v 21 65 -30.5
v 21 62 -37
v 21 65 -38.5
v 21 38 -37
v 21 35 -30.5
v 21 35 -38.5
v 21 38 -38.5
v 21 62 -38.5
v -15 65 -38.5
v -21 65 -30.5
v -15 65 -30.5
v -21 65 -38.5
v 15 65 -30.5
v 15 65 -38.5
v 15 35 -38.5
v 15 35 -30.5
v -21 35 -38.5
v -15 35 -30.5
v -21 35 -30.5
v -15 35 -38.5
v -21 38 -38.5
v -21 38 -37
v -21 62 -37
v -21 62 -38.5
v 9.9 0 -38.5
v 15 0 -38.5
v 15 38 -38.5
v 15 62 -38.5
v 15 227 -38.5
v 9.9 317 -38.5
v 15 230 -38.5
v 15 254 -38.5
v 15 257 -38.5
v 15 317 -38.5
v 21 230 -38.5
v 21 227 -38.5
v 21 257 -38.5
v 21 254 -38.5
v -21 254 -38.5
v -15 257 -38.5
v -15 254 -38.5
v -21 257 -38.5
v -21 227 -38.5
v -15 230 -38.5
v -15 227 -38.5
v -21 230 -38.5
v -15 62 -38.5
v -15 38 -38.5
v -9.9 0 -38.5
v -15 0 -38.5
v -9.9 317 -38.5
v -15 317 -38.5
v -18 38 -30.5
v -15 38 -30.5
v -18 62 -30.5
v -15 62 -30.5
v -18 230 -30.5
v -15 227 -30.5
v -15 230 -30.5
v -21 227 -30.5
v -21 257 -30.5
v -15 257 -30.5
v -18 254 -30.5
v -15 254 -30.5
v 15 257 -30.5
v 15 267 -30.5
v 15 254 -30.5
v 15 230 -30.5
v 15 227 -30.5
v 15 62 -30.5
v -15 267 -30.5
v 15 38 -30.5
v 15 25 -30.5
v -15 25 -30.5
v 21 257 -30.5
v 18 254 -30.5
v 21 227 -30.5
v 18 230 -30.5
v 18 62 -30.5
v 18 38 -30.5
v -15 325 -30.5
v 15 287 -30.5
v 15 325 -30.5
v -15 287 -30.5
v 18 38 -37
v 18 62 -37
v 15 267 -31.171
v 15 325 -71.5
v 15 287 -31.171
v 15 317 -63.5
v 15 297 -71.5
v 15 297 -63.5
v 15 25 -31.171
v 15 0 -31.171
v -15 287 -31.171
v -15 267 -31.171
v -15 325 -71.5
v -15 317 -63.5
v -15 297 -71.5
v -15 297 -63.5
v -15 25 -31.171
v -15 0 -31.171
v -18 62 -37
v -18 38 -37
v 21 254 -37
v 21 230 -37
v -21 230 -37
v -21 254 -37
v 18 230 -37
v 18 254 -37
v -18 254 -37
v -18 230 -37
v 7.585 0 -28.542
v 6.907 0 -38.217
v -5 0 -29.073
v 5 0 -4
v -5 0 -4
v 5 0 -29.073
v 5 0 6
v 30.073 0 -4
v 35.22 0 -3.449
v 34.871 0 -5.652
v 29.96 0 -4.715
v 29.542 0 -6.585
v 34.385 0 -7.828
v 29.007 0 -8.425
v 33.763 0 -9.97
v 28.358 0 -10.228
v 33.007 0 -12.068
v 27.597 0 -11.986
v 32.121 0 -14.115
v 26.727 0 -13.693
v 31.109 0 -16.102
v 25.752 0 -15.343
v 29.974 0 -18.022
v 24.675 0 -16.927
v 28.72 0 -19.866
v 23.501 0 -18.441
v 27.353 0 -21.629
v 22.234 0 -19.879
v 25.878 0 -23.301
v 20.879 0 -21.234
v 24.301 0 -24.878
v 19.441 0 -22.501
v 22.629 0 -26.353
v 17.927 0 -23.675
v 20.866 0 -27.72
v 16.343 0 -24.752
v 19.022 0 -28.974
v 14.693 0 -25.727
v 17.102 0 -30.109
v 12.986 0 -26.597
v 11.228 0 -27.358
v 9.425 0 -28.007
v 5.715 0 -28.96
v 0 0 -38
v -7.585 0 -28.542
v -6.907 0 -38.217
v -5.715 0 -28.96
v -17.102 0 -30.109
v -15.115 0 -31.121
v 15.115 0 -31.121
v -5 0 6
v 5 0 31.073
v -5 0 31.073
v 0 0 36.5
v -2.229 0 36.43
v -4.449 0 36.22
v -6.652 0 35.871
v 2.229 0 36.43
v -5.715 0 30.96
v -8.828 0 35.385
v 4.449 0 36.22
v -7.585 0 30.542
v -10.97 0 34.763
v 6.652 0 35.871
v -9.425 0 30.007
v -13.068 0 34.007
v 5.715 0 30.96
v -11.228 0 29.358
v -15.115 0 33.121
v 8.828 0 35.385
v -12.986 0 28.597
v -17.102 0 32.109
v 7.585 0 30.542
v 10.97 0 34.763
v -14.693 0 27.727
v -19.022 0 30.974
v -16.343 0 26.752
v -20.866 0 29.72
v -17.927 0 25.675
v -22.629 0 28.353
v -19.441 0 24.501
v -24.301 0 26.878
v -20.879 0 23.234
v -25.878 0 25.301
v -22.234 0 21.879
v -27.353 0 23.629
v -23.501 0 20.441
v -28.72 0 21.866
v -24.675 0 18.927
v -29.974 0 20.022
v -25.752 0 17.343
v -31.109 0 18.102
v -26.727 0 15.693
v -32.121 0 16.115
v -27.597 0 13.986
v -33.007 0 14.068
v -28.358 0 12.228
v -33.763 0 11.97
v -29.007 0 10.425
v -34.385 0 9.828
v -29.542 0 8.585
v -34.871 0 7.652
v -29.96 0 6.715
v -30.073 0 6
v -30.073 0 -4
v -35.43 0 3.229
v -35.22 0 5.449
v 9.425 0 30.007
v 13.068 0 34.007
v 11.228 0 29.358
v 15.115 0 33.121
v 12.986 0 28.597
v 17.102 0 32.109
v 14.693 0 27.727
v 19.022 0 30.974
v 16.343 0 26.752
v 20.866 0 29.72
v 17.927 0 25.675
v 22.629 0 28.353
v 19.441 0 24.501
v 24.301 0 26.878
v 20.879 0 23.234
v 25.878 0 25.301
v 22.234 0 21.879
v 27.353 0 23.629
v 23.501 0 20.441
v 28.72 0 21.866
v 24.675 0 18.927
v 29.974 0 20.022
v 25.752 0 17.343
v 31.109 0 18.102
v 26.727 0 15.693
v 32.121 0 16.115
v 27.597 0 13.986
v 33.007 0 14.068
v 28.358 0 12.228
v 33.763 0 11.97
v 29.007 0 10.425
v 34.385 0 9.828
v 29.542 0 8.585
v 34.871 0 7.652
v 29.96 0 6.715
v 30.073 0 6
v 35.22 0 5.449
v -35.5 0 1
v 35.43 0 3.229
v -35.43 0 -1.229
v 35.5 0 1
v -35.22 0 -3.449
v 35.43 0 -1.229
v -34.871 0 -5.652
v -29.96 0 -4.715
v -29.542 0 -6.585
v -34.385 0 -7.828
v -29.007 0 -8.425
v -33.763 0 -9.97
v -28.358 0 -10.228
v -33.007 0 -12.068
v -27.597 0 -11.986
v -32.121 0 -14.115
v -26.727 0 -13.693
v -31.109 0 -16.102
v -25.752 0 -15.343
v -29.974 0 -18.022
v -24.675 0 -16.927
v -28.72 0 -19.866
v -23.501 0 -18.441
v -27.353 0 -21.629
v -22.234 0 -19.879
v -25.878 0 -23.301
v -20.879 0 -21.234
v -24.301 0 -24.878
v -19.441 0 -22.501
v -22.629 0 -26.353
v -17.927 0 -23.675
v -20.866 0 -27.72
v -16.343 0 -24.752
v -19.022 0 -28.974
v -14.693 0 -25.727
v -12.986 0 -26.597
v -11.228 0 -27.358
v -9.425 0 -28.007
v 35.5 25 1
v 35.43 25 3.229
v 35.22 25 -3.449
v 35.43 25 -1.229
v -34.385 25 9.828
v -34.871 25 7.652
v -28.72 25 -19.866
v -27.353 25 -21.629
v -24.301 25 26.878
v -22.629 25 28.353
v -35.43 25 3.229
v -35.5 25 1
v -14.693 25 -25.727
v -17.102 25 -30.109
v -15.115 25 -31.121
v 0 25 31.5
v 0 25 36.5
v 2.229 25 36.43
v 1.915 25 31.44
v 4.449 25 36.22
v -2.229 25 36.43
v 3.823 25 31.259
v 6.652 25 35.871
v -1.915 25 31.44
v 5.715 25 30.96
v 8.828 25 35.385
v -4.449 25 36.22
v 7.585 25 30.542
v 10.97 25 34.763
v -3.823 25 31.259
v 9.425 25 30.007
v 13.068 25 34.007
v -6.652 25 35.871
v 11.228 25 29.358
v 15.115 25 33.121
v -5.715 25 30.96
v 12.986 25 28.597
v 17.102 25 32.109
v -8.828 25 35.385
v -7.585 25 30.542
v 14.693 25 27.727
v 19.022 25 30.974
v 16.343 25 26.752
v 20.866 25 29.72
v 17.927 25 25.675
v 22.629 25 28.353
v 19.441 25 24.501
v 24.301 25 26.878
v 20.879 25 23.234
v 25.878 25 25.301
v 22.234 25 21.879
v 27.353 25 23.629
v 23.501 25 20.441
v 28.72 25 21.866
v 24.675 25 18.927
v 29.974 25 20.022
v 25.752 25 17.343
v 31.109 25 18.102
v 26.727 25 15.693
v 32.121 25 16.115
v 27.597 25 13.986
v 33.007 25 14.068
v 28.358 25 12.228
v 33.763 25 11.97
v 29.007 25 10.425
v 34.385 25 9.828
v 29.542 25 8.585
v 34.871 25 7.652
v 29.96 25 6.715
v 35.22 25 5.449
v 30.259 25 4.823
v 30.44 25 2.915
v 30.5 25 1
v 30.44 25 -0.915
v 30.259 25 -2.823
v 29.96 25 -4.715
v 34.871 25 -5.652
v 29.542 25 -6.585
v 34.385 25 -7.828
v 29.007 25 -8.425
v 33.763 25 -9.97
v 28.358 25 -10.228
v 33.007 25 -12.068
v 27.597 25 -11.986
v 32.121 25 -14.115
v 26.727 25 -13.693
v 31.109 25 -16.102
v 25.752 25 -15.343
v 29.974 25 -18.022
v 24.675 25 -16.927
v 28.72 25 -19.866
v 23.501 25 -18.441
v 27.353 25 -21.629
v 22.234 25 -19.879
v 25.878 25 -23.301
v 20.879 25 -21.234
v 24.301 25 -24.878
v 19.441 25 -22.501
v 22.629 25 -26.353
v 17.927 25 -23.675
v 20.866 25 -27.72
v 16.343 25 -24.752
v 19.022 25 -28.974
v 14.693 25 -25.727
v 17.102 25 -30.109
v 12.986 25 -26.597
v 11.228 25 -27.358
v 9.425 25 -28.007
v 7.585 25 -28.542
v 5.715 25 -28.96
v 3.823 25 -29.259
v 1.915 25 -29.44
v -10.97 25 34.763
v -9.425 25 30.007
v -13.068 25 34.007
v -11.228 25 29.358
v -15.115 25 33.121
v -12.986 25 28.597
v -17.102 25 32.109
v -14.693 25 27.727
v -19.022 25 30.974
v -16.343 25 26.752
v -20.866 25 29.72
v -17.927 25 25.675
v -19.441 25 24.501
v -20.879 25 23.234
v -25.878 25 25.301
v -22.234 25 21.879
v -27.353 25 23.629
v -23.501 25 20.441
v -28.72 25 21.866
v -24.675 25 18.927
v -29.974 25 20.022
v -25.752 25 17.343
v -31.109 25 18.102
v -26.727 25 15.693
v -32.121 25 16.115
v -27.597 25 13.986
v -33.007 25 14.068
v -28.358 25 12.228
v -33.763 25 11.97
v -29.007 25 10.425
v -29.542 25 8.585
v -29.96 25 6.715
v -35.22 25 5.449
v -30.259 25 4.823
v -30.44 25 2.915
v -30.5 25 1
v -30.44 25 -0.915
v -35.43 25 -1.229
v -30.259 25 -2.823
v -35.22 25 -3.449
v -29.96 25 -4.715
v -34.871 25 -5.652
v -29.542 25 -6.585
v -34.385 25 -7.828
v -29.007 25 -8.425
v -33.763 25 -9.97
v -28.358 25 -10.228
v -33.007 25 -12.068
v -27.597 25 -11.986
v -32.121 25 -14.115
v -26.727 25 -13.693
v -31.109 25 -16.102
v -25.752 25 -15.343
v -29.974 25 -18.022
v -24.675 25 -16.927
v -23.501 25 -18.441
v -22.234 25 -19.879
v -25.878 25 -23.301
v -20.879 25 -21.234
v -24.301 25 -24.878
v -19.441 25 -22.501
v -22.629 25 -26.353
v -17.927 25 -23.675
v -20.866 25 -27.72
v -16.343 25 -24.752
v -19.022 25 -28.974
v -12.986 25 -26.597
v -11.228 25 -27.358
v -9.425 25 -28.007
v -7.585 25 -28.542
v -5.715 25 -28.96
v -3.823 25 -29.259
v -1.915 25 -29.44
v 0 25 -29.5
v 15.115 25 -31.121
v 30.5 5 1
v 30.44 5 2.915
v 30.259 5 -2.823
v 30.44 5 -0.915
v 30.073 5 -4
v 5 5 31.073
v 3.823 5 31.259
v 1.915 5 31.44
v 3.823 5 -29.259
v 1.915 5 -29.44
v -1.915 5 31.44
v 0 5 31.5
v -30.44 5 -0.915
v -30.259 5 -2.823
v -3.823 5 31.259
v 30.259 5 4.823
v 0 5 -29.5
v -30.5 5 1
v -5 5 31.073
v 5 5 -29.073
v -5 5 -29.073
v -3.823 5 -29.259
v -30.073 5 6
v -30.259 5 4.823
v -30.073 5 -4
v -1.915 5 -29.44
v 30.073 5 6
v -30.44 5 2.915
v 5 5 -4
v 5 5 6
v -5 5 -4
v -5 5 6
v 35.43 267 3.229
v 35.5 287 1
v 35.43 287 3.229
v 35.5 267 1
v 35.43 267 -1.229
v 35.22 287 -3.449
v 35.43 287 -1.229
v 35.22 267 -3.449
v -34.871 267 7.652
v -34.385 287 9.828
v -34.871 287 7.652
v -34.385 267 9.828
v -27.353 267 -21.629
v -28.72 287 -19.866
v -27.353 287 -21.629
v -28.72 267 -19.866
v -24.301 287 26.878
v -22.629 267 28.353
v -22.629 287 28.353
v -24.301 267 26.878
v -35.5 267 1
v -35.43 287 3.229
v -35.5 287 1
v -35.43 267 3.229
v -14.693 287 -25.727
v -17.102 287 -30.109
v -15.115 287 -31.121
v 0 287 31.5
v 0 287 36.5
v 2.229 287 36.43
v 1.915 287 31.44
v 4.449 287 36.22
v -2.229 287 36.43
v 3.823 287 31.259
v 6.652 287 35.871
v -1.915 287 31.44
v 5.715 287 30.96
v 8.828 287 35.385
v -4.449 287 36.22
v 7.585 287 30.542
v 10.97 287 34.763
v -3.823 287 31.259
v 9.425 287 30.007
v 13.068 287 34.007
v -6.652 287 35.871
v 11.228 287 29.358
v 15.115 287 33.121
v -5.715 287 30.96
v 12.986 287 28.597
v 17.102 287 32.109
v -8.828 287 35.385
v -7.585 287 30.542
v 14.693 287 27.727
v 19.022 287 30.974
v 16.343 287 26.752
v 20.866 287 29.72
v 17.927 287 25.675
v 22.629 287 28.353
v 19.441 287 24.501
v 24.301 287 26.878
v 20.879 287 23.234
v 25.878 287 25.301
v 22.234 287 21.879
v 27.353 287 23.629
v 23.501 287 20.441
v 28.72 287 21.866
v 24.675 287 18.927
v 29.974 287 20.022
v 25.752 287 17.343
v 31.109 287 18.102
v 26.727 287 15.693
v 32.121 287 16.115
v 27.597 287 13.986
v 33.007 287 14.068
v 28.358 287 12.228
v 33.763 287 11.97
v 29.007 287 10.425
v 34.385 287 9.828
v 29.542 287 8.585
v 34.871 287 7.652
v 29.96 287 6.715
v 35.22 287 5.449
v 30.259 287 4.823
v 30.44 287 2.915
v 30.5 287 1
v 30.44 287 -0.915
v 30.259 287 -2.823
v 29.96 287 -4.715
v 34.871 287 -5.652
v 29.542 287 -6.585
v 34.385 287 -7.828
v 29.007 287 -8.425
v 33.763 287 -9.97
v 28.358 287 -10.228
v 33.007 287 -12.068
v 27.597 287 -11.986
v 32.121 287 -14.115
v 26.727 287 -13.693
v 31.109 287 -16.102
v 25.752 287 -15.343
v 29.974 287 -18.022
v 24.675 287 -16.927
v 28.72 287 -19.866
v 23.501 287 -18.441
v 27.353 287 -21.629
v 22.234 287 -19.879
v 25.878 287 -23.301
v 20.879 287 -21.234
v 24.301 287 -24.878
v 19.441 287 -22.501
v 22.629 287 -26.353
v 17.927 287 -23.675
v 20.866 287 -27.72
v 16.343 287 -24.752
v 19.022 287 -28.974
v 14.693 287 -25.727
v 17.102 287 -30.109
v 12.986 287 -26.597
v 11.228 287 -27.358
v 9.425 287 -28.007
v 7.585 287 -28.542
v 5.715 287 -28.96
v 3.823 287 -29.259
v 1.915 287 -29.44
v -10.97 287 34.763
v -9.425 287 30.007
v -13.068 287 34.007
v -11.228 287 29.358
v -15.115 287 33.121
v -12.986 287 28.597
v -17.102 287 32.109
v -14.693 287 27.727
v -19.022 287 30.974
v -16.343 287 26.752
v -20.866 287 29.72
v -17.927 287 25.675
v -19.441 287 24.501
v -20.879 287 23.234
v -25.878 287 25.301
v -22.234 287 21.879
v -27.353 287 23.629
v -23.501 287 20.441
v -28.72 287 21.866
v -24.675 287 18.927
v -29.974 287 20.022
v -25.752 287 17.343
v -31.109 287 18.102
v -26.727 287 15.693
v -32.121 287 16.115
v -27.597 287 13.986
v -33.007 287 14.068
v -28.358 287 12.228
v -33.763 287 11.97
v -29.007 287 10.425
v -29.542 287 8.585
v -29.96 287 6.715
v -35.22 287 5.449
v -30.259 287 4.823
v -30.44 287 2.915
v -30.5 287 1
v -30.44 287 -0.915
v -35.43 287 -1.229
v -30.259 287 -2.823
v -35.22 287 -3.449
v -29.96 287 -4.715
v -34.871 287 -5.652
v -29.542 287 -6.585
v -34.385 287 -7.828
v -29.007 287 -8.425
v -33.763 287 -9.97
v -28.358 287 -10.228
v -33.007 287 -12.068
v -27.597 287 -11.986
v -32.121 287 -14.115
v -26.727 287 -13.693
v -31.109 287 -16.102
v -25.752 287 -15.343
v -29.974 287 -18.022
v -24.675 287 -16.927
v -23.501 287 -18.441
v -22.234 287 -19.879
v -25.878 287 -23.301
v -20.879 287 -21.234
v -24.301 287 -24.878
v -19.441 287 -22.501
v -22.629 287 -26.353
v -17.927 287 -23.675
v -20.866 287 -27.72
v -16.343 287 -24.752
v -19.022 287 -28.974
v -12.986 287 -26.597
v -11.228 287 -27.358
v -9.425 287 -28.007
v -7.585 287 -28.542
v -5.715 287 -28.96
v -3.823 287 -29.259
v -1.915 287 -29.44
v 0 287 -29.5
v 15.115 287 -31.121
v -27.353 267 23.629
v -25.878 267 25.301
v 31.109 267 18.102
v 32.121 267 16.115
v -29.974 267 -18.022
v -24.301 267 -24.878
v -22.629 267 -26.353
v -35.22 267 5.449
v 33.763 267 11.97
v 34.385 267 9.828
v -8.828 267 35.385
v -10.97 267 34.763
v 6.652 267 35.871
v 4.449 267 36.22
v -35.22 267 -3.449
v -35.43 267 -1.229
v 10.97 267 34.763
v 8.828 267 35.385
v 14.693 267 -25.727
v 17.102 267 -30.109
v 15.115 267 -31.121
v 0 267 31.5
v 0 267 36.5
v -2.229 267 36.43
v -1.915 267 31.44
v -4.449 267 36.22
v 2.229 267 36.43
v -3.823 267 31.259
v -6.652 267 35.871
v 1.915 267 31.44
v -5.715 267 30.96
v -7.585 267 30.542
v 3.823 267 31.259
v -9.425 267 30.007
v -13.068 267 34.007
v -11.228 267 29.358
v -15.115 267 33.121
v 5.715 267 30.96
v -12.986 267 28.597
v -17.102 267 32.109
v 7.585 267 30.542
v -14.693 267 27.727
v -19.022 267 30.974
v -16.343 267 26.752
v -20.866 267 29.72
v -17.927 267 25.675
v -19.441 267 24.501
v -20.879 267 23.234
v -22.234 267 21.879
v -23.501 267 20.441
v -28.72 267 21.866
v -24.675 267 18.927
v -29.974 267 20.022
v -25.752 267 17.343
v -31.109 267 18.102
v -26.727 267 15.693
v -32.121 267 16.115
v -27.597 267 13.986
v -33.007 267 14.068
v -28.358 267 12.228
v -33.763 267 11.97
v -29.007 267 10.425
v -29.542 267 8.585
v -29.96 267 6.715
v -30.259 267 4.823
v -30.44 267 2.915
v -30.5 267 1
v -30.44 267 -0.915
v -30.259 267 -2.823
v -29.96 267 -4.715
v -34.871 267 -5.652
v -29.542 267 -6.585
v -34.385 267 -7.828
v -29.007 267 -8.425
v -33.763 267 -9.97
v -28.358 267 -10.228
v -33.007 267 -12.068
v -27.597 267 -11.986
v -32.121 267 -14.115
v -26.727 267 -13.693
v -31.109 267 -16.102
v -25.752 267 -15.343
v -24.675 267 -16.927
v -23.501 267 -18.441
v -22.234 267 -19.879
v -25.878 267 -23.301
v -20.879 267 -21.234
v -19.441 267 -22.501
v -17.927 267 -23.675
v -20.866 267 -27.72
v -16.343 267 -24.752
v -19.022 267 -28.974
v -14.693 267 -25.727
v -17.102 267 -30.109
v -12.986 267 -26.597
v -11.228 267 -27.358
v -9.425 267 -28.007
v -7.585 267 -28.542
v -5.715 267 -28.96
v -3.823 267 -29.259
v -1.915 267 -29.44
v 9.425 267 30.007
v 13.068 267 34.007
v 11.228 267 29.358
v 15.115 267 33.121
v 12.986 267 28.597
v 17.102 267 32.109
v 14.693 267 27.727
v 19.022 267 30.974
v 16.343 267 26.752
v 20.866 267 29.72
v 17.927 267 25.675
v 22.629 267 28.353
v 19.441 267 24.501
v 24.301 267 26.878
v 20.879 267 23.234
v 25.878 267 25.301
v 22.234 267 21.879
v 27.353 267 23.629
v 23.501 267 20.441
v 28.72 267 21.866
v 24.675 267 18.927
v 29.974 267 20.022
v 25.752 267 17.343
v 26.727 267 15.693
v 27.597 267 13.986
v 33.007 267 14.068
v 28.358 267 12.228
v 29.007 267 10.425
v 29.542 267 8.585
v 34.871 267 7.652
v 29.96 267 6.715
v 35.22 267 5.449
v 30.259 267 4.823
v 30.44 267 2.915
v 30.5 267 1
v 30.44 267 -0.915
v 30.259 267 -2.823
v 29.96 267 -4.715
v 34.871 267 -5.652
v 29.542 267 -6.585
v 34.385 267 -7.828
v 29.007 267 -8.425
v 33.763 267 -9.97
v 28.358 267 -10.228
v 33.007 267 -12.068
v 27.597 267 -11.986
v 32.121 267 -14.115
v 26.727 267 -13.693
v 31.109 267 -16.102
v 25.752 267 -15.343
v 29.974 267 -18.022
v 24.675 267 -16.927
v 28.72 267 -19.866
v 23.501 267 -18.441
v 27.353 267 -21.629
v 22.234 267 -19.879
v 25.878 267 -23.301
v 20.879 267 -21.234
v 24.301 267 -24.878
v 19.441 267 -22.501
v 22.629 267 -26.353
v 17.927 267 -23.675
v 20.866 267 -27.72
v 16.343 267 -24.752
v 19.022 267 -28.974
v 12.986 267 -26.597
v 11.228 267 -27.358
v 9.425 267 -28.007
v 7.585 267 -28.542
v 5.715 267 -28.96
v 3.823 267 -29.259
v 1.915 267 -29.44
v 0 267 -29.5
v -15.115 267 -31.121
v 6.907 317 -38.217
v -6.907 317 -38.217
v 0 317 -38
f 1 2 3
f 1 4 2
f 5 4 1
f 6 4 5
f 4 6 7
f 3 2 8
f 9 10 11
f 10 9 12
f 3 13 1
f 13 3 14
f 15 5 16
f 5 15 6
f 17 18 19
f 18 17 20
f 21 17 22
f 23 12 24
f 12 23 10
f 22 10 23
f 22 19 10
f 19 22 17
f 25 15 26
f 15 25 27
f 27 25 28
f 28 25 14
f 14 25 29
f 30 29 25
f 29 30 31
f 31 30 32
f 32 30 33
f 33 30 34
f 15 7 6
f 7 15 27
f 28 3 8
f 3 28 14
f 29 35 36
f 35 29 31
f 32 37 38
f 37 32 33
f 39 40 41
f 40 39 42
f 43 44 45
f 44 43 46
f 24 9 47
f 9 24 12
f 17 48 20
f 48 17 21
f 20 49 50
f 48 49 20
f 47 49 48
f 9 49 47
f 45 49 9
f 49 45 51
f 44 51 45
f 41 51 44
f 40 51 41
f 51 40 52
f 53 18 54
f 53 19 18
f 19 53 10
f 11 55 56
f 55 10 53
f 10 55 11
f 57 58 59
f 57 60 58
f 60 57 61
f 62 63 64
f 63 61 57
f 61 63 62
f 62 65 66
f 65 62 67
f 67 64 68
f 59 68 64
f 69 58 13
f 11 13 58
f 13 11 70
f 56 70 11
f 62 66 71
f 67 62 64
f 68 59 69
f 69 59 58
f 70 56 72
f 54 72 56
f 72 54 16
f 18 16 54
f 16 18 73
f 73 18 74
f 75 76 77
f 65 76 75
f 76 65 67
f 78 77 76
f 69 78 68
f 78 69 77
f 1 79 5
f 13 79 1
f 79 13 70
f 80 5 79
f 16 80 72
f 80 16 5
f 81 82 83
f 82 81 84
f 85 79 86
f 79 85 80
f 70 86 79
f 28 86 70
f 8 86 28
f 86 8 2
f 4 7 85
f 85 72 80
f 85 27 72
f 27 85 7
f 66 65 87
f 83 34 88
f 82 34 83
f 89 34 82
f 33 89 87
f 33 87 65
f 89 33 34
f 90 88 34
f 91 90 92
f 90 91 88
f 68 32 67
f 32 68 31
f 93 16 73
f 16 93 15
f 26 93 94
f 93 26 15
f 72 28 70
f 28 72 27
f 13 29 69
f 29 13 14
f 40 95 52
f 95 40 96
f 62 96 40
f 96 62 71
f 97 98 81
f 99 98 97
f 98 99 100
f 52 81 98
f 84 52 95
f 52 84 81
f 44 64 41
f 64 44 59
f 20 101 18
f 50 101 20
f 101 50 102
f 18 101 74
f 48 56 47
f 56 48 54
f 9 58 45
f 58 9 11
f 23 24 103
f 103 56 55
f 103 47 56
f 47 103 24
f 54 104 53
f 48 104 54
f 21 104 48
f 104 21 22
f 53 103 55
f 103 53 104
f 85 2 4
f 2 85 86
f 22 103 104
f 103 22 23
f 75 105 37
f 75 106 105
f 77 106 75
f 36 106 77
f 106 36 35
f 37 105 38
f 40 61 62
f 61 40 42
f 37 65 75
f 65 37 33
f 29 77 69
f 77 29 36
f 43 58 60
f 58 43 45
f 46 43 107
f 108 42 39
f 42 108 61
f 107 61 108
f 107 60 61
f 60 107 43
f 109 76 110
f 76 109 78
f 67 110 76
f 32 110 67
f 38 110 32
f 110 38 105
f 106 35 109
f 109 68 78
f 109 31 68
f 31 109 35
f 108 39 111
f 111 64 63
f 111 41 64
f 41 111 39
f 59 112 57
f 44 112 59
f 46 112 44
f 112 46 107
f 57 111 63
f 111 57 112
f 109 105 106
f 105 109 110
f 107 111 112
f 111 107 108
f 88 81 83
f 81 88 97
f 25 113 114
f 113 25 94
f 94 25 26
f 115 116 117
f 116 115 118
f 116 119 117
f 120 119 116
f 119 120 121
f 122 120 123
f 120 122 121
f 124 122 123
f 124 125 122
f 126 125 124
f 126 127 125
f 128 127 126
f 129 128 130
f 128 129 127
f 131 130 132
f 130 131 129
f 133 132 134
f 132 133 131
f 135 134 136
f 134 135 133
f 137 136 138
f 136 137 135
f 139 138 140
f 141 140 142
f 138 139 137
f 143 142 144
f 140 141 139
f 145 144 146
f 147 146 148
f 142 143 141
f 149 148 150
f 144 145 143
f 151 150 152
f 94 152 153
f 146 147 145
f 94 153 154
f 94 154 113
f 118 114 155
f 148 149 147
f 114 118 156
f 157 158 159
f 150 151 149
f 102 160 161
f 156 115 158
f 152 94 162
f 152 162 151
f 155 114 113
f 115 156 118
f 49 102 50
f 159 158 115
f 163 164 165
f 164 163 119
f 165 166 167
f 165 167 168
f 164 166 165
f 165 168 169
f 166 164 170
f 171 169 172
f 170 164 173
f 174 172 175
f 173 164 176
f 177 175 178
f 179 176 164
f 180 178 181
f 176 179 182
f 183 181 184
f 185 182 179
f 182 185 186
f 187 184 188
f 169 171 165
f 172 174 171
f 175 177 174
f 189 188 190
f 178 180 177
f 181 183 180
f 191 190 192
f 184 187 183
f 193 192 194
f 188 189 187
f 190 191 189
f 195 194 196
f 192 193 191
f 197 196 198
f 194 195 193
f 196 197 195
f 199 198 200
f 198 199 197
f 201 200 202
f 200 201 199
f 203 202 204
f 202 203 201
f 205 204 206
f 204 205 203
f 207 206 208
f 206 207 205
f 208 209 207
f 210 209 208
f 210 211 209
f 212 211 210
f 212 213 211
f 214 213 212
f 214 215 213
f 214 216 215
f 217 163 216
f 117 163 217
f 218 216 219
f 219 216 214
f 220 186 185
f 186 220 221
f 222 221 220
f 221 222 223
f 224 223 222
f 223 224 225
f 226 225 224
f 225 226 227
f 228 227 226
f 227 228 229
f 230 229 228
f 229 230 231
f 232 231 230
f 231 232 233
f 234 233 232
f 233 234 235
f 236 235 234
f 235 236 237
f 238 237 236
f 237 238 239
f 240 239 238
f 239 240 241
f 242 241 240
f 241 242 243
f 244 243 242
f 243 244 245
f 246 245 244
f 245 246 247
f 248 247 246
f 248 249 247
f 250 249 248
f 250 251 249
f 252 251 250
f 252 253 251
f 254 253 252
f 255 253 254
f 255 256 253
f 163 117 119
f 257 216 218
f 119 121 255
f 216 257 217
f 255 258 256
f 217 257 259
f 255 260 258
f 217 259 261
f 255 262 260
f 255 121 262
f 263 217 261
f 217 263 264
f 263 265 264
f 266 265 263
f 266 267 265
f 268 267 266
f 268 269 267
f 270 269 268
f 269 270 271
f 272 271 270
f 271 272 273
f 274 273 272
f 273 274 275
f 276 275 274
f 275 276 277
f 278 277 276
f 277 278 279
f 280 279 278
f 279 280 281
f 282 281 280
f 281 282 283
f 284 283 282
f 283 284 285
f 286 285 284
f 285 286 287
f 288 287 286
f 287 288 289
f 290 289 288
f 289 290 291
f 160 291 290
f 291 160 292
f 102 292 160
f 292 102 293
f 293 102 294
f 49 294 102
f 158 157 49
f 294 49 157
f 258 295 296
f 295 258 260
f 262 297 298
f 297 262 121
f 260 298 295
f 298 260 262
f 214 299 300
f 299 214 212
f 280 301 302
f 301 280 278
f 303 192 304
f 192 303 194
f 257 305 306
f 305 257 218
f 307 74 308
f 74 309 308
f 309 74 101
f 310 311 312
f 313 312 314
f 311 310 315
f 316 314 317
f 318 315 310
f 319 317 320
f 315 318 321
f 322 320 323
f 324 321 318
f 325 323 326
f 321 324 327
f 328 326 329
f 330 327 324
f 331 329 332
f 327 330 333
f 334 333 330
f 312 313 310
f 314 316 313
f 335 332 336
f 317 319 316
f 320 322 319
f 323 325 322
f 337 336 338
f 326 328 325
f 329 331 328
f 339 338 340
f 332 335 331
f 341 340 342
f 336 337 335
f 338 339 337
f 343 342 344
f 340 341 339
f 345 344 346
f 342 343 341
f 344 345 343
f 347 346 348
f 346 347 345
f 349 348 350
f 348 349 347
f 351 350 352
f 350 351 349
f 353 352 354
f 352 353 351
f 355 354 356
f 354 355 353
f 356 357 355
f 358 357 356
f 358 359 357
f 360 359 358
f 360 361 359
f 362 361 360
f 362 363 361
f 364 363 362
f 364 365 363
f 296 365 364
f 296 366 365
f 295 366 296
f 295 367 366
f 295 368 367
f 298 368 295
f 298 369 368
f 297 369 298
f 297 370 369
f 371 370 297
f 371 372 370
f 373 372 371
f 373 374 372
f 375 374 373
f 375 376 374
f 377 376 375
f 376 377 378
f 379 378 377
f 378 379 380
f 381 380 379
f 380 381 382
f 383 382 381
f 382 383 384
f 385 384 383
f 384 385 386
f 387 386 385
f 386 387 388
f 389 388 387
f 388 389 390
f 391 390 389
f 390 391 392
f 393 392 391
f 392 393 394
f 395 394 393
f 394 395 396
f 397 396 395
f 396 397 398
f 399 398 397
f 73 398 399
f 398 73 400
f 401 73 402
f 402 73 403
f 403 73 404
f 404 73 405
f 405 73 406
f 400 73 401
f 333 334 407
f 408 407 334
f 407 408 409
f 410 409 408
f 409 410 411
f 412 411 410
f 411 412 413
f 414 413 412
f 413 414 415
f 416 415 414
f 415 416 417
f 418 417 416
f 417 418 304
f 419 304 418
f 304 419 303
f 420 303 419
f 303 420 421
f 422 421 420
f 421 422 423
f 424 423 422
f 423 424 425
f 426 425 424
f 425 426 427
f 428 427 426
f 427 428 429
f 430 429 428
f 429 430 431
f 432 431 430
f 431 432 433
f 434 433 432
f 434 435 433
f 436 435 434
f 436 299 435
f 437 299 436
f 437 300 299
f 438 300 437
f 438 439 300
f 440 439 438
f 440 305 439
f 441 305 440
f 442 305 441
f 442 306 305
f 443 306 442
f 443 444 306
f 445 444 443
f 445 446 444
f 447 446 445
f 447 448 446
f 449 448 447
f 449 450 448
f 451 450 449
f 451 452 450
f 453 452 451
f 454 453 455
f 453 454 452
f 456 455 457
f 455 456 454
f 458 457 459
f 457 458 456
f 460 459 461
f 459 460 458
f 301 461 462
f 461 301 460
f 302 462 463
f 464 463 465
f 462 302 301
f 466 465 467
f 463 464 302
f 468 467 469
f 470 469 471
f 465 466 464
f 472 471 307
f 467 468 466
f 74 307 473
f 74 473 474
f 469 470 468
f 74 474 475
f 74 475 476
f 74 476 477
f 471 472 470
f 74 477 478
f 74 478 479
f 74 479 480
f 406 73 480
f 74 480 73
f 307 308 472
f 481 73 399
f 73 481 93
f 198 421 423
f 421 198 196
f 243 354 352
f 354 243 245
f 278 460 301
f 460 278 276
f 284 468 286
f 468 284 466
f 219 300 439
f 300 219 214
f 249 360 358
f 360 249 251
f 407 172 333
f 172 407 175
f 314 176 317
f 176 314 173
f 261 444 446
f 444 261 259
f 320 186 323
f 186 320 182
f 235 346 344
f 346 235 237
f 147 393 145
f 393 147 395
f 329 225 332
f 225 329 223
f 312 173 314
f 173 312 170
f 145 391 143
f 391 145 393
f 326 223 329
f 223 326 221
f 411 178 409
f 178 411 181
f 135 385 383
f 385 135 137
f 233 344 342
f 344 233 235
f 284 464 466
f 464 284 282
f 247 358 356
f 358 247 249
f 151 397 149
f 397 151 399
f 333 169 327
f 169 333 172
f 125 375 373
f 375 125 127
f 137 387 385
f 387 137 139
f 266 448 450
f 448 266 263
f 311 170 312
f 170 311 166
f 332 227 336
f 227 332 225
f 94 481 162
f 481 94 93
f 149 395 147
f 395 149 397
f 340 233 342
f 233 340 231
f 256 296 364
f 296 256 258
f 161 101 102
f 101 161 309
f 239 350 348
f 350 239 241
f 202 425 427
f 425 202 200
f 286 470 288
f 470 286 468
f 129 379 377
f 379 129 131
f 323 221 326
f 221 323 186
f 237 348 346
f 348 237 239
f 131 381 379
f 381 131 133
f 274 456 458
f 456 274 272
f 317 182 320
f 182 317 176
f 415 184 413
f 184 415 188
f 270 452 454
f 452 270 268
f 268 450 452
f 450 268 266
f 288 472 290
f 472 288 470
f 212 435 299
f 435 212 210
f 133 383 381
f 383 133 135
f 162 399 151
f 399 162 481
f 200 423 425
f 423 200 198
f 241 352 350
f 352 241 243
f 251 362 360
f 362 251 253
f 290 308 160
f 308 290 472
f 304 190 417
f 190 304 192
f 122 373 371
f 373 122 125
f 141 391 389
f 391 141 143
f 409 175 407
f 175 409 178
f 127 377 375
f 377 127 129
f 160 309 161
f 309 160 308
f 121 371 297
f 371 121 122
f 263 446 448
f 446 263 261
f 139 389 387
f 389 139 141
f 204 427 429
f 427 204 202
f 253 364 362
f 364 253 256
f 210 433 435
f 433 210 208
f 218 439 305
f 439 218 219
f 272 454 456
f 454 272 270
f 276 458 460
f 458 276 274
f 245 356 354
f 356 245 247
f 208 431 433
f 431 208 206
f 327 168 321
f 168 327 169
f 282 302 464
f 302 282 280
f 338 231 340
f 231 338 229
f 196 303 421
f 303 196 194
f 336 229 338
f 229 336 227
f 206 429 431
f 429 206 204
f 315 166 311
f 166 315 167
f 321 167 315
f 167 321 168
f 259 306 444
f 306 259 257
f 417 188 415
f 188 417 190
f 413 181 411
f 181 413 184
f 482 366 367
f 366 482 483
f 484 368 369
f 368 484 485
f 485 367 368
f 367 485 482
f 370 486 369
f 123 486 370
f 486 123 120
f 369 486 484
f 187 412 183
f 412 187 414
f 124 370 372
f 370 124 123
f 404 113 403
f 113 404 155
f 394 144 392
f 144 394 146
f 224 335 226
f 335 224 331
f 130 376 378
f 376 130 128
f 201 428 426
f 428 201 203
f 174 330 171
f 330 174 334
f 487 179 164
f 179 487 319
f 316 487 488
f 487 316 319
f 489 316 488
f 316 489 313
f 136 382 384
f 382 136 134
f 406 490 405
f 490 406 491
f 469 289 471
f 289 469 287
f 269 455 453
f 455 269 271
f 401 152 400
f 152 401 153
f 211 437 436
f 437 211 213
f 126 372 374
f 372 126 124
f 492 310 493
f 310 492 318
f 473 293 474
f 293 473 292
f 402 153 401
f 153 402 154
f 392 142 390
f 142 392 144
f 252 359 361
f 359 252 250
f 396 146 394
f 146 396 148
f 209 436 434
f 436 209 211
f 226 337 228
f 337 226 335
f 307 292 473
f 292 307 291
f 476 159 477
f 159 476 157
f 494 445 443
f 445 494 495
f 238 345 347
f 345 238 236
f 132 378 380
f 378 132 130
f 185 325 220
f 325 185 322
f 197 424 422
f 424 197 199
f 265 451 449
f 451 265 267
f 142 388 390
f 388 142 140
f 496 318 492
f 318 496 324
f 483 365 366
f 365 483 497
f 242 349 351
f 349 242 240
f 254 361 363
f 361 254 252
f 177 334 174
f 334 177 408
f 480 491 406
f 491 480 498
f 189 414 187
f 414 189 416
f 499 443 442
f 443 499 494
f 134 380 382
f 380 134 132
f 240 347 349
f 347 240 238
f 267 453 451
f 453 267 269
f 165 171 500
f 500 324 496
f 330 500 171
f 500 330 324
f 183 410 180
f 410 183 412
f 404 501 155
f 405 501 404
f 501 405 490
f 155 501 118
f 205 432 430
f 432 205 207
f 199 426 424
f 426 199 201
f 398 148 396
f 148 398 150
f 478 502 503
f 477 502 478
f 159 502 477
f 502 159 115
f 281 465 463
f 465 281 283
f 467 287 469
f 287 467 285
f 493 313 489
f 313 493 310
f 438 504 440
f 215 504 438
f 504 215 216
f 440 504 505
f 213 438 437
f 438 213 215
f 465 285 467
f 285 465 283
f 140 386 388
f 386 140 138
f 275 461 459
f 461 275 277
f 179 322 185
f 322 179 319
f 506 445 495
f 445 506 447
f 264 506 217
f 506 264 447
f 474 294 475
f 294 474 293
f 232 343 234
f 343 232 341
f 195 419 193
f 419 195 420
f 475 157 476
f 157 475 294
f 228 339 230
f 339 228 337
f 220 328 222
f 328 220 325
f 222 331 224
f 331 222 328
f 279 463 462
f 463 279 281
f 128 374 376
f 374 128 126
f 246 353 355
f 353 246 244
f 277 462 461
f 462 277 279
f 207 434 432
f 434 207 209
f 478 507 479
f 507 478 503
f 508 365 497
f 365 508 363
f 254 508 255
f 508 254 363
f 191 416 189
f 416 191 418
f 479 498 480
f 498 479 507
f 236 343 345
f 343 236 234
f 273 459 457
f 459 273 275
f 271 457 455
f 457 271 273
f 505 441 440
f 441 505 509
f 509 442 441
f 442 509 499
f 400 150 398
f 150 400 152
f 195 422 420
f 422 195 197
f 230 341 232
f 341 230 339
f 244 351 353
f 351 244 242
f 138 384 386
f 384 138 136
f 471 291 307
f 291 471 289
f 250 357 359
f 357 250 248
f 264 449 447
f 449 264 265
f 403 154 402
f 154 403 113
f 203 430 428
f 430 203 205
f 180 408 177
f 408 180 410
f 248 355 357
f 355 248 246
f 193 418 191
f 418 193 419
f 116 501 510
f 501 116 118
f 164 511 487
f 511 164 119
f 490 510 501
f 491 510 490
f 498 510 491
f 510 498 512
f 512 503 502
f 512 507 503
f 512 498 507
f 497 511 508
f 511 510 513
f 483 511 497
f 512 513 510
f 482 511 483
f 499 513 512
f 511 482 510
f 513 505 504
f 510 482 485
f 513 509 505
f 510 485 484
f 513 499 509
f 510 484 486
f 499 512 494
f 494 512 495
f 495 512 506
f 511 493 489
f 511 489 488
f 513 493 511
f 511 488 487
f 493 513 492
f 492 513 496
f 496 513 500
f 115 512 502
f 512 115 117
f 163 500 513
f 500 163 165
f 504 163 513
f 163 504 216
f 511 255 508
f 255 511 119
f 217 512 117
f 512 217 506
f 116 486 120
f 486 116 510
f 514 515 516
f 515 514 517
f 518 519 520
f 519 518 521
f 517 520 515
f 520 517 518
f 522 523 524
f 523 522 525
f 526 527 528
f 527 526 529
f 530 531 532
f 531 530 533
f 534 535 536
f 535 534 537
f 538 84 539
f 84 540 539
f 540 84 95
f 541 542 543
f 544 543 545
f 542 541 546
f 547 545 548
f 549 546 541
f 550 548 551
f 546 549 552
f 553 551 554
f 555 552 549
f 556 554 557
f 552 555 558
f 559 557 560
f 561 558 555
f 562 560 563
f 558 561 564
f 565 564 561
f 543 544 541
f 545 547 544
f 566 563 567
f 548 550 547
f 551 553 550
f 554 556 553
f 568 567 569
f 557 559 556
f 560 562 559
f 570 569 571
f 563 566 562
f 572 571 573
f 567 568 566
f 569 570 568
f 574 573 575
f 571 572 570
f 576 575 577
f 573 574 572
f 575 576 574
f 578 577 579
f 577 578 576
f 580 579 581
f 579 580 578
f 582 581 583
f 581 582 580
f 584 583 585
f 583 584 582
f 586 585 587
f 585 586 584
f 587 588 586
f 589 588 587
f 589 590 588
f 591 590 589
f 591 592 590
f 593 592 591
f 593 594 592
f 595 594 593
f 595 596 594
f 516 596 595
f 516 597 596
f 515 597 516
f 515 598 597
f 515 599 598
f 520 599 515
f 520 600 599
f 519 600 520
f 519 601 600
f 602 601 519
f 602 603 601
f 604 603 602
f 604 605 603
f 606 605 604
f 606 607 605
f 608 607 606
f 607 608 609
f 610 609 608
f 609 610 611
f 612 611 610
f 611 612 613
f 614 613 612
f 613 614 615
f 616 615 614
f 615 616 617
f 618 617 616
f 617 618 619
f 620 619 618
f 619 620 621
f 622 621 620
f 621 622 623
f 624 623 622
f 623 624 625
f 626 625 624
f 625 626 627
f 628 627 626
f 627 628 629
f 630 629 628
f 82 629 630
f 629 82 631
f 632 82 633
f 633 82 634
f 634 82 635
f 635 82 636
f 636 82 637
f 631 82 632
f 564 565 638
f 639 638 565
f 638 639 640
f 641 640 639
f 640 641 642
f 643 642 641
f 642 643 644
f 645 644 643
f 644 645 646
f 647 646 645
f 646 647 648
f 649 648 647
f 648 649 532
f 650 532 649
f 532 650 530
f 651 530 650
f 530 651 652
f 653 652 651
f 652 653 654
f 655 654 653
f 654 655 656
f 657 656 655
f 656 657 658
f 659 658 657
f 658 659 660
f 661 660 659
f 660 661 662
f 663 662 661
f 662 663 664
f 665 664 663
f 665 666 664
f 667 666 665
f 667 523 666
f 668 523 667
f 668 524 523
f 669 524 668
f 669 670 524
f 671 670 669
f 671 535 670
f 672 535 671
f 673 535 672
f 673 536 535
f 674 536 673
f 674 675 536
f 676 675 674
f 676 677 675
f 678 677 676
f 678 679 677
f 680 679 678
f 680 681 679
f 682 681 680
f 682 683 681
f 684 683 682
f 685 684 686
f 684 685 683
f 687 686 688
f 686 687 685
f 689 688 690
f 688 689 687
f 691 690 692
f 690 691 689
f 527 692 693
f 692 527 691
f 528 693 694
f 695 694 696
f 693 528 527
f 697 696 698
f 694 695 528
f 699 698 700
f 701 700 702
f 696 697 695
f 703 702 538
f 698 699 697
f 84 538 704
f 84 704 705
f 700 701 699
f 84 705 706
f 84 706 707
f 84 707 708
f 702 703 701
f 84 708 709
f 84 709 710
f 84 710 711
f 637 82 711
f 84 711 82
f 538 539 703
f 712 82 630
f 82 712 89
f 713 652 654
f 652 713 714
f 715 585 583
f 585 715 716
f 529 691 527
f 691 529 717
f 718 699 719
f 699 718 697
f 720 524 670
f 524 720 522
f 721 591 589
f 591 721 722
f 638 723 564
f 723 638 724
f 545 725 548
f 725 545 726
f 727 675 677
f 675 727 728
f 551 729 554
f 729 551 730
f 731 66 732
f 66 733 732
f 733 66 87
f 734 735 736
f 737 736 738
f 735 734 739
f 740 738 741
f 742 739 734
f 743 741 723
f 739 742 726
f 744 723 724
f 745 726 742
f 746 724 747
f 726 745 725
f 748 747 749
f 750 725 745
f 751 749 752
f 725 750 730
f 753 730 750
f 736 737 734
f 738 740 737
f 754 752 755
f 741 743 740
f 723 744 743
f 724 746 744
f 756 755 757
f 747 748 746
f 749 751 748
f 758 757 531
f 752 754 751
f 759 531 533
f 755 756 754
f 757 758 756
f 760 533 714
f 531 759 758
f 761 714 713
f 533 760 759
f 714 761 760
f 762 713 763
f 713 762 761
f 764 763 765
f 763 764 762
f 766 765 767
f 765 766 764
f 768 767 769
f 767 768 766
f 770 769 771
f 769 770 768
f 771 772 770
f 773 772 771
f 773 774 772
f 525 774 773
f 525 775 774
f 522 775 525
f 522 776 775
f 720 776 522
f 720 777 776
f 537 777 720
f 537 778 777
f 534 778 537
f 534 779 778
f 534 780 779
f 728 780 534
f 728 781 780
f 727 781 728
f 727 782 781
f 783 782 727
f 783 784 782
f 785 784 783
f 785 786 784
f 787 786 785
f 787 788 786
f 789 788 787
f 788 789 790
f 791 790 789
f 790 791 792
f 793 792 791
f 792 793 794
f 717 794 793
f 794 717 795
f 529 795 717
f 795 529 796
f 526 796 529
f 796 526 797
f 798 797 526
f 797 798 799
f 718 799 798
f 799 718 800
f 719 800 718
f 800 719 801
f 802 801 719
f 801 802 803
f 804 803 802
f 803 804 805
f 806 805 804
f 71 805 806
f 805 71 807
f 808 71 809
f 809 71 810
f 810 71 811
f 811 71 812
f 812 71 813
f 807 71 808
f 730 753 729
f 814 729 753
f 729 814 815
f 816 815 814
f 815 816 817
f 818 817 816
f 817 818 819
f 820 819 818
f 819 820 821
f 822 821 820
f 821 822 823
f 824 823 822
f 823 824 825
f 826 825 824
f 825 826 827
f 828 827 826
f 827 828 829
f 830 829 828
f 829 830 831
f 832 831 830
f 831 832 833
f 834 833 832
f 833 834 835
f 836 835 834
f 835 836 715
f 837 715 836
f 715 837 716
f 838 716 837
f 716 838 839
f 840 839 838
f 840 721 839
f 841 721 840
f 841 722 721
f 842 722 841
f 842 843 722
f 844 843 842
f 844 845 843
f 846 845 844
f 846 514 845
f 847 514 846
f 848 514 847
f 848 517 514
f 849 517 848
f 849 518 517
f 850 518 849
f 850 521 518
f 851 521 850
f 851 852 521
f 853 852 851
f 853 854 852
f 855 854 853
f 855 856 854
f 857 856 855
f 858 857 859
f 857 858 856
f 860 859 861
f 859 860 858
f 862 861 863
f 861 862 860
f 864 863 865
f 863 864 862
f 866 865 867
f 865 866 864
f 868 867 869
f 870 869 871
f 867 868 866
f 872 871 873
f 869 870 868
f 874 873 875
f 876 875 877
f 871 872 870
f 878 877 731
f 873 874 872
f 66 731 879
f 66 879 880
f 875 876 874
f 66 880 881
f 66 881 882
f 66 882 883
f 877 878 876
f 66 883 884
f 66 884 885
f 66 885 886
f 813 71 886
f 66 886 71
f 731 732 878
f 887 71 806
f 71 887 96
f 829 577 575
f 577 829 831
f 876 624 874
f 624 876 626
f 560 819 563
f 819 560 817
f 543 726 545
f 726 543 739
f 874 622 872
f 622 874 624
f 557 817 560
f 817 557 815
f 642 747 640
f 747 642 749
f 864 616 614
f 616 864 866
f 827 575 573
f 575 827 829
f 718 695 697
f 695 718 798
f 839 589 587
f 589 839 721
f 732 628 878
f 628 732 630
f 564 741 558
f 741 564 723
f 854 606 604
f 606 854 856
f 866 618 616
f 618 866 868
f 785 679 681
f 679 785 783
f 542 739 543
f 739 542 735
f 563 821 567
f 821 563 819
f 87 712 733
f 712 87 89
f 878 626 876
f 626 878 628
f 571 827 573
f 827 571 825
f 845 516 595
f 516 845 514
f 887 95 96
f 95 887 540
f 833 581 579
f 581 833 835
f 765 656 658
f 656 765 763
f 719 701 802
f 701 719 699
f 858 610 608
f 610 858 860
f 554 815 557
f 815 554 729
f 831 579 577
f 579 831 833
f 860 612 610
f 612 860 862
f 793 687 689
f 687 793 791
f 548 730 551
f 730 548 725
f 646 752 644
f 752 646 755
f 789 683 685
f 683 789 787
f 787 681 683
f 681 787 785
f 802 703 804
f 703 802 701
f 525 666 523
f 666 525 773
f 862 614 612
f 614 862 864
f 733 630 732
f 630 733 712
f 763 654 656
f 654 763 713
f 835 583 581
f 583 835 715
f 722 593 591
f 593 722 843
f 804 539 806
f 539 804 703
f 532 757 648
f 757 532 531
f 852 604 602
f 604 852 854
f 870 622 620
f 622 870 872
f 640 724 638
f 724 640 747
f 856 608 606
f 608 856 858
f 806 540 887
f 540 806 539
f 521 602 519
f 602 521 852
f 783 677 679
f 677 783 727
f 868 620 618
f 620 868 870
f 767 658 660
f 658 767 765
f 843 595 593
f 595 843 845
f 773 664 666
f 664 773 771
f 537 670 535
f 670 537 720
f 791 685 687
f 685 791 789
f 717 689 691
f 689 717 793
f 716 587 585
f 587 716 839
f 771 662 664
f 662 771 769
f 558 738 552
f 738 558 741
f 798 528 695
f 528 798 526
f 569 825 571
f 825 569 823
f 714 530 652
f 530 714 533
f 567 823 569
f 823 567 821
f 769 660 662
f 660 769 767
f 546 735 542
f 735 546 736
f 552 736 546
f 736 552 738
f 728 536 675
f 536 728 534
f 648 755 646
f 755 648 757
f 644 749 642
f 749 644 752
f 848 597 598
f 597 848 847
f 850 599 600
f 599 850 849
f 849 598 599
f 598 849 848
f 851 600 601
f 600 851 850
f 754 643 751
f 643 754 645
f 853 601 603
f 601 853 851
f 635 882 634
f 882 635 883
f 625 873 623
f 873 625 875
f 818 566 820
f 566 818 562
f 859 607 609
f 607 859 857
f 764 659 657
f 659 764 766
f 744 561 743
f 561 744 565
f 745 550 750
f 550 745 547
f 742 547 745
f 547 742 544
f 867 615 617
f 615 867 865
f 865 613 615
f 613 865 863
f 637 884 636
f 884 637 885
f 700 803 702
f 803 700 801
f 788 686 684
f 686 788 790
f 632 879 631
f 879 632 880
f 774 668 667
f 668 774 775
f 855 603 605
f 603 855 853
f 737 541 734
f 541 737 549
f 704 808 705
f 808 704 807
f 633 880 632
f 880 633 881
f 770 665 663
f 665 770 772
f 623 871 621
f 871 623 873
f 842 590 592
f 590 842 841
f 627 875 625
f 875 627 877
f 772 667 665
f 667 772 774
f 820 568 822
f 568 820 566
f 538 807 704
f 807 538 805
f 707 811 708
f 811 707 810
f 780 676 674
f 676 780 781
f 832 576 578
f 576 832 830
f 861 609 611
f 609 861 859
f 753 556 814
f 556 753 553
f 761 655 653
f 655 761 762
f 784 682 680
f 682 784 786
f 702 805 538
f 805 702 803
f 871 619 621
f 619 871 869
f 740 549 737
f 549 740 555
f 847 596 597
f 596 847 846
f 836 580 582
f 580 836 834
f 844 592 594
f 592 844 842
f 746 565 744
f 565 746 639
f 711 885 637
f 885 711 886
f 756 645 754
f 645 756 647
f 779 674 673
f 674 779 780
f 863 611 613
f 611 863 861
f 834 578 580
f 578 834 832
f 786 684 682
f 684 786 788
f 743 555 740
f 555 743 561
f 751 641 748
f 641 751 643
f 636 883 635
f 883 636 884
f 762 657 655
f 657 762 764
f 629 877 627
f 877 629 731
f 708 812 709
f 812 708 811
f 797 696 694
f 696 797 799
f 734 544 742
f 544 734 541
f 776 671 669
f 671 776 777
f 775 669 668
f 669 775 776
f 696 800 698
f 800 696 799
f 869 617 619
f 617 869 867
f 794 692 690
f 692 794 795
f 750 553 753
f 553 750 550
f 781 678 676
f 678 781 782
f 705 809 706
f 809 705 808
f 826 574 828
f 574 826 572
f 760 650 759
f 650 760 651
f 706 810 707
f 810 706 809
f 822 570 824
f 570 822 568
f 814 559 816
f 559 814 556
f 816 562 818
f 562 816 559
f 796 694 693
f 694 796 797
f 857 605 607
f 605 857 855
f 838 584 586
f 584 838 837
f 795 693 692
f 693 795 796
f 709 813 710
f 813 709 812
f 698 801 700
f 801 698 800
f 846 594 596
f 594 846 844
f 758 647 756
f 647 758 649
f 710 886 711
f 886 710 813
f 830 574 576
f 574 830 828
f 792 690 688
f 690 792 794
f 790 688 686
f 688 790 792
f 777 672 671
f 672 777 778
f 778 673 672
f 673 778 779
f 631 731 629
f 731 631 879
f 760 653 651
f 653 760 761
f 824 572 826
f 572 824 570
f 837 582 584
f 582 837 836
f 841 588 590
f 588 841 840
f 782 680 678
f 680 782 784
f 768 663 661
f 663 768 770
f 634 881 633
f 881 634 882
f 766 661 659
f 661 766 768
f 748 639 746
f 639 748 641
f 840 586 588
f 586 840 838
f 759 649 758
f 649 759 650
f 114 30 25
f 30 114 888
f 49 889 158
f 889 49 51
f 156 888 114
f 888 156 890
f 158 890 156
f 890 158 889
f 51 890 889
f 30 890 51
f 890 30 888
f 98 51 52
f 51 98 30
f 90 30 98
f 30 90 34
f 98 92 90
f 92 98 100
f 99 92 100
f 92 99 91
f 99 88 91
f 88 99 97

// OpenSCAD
// file: sodastream_tube_holder.scad
// Copyright: Olle Johansson 2018
// License: CC BY-SA

//CUSTOMIZER VARIABLES

// This is the total height of the holder
height_of_holder = 325;

// Width of the Sodastream bottle
inner_width_of_collars = 60;

// The height of each collar around the Sodastream bottle
height_of_collars = 20; // [10:50]

// Thickness of collar walls
thickness_of_collars = 5; // [1:10]

// Thickness of the cross at the bottom of the base collar
thickness_of_bottom = 5; // [1:10]

// Detpth of the hook at the top
depth_of_hook = 25; // [10:40]

// Height of the hook from the top
height_of_hook = 20; // [5:30]

// Thickness of the holder connecting the collars
thickness_of_holder = 8; // [5:10]

// Width of the holder connecting the collars
width_of_holder = 30; // [10:50]

// Height of the strap buckles
height_of_buckle = 30; // [20:50]

//CUSTOMIZER VARIABLES END

$fn=100;

BASE_WIDTH = inner_width_of_collars + 1; // Adding some tolerance
BASE_HEIGHT = height_of_collars;

THICKNESS_WALL = thickness_of_collars;
THICKNESS_BASE = thickness_of_bottom;

OUTER_DIAMETER = BASE_WIDTH + THICKNESS_WALL * 2;

BASE_SUPPORT_WIDTH = 10;
CUT_SPACING = 10;

HOOK_DEPTH = depth_of_hook;
HOOK_HEIGHT = height_of_hook;

HOLDER_THICKNESS = thickness_of_holder;
HOLDER_HEIGHT = height_of_holder;
//HOLDER_HEIGHT = 280 + THICKNESS_BASE + HOLDER_THICKNESS + HOOK_HEIGHT + CUT_SPACING;
HOLDER_WIDTH = width_of_holder;
HOLDER_POSITION = BASE_WIDTH / 2 + HOLDER_THICKNESS / 2;

KEG_RADIUS = 110;

COLLAR_HEIGHT = height_of_collars;

STRAP_BUCKLE_HEIGHT = height_of_buckle;
STRAP_BUCKLE_WALL = 3;
STRAP_THICKNESS = 3;
STRAP_WIDTH = STRAP_BUCKLE_HEIGHT - STRAP_BUCKLE_WALL * 2;
STRAP_BUCKLE_WIDTH = HOLDER_WIDTH + STRAP_THICKNESS * 2 + STRAP_BUCKLE_WALL * 2;
LOWER_BUCKLE_POSITION = BASE_HEIGHT + THICKNESS_BASE + STRAP_BUCKLE_HEIGHT / 2 + CUT_SPACING;
UPPER_BUCKLE_POSITION = HOLDER_HEIGHT - HOLDER_THICKNESS - HOOK_HEIGHT - COLLAR_HEIGHT - STRAP_BUCKLE_HEIGHT / 2 - CUT_SPACING * 2;

// Hanger
module hanger() {
    translate([0, HOLDER_POSITION, HOLDER_HEIGHT / 2]) {
        cube(size = [HOLDER_WIDTH, HOLDER_THICKNESS, HOLDER_HEIGHT], center = true);
    }
    
    // Lower strap buckle
    translate([0, HOLDER_POSITION, LOWER_BUCKLE_POSITION]) {
        strap_buckle();
    }

    // Upper strap buckle
    translate([0, HOLDER_POSITION, UPPER_BUCKLE_POSITION]) {
        strap_buckle();
    }
}

module base() {
    // Collar
    difference() {
        cylinder(h=THICKNESS_BASE + BASE_HEIGHT, d=OUTER_DIAMETER);
        
        cylinder(h=BASE_HEIGHT + BASE_HEIGHT, d=BASE_WIDTH);
     }
    
    // Base supports
    translate([0, 0, THICKNESS_BASE / 2]) {
        cube([BASE_SUPPORT_WIDTH, BASE_WIDTH + THICKNESS_WALL, THICKNESS_BASE], center=true);
        rotate([0, 0, 90])
            cube([BASE_SUPPORT_WIDTH, BASE_WIDTH + THICKNESS_WALL, THICKNESS_BASE], center=true);
    }
}

module collar() {
    translate([0, 0, HOLDER_HEIGHT - COLLAR_HEIGHT - HOOK_HEIGHT - HOLDER_THICKNESS - CUT_SPACING]) {
        
        difference() {
            cylinder(h=COLLAR_HEIGHT, d=OUTER_DIAMETER);
            
            cylinder(h=COLLAR_HEIGHT, d=BASE_WIDTH);
        }
    }    
}

module strap_buckle() {
    difference() {
        cube([STRAP_BUCKLE_WIDTH, HOLDER_THICKNESS, STRAP_BUCKLE_HEIGHT], center=true);

        // Strap holes
        translate([HOLDER_WIDTH / 2 + STRAP_THICKNESS / 2, 0, 0]) {
            cube([STRAP_THICKNESS, HOLDER_THICKNESS, STRAP_WIDTH], center = true);
        }
        translate([0 - (HOLDER_WIDTH / 2 + STRAP_THICKNESS / 2), 0, 0 ]) {
            cube([STRAP_THICKNESS, HOLDER_THICKNESS, STRAP_WIDTH], center = true);
        }
        
        // Make room for straps behind buckle
        strap_hole_pos = HOLDER_THICKNESS / 2 - STRAP_THICKNESS / 2 + 1;
        translate([HOLDER_WIDTH / 2 + STRAP_THICKNESS, strap_hole_pos, 0]) {
            cube([STRAP_BUCKLE_WALL * 2, 2, STRAP_WIDTH], center = true);
        }
        translate([0 - (HOLDER_WIDTH / 2 + STRAP_THICKNESS), strap_hole_pos, 0]) {
            cube([STRAP_BUCKLE_WALL * 2, 2, STRAP_WIDTH], center = true);
        }
    }
}

module hook() {
    // Horizontal lip
    translate([0, (BASE_WIDTH + HOOK_DEPTH) / 2 + HOLDER_THICKNESS, HOLDER_HEIGHT - HOLDER_THICKNESS / 2]) {
        cube([HOLDER_WIDTH, HOOK_DEPTH, HOLDER_THICKNESS], center = true);
    }
    
    // Vertical hook
    translate([0, BASE_WIDTH / 2 + HOOK_DEPTH + HOLDER_THICKNESS * 1.5, HOLDER_HEIGHT - HOOK_HEIGHT / 2 - HOLDER_THICKNESS / 2]) {
        cube([HOLDER_WIDTH, HOLDER_THICKNESS, HOOK_HEIGHT + HOLDER_THICKNESS], true);
    } 
}

module holder() {
    hanger();
    translate([0, -1, 0]) base();
    translate([0, -1, 0]) collar();
}

module drawHolder() {
    // Curved back of holder
    difference() {
        holder();
        
        // Make back rounded to fit keg
        translate([0, BASE_WIDTH / 2 + HOLDER_THICKNESS + KEG_RADIUS - 0.5, 0]) {
            cylinder(h=HOLDER_HEIGHT - HOLDER_THICKNESS, r=KEG_RADIUS, center=false);
        }
    }

    // Add hook (outside of holder, to not be in the way for the curved back)
    hook();
}

module rotatedHolder() {
    //translate([0, 0, - OUTER_DIAMETER / 2])
        rotate([-90, 0, 0])
            drawHolder();
}

rotatedHolder();
//drawHolder();
// file: libs/hugo_dovetail.scad
/**
 *  Dovetail parametric generator for OpenScad
 *  Générateur de queue d'aronde pour OpenScad
 *
 *  Copyright (c) 2012 Charles Rincheval.  All rights reserved.
 *
 *  This library is free software; you can redistribute it and/or
 *  modify it under the terms of the GNU Lesser General Public
 *  License as published by the Free Software Foundation; either
 *  version 2.1 of the License, or (at your option) any later version.
 *
 *  This library is distributed in the hope that it will be useful,
 *  but WITHOUT ANY WARRANTY; without even the implied warranty of
 *  MERCHANTABILITY or FITNESS FOR A PARTICULAR PURPOSE.  See the GNU
 *  Lesser General Public License for more details.
 *
 *  You should have received a copy of the GNU Lesser General Public
 *  License along with this library; if not, write to the Free Software
 *  Foundation, Inc., 51 Franklin St, Fifth Floor, Boston, MA  02110-1301  USA
 *
 *  Last update :
 *  https://github.com/hugokernel/OpenSCAD_Dovetail
 *
 *  http://www.digitalspirit.org/
 */

/**
 *  Create one teeth
 *  @param int width        Teeth width
 *  @param int height       Teeth height
 *  @param int thickness    Teeth thickness
 */
module dovetail_teeth(width, height, thickness) {
    offset = width / 3;
    translate([- width / 2, - height / 2, 0]) {
        linear_extrude(height = thickness) {
            polygon([[0, 0], [width, 0], [width - offset, height], [offset, height]]);
        }
    }
}


/**
 *  Dovetail
 *  @param int  width           Dovetail width
 *  @param int  teeth_count     Teeth count
 *  @param int  teeth_height    Teeth height
 *  @param int  teeth_thickness Teeth thickness
 *  @param int  clear           Teeth clear
 *  @param bool male            Get male (true) or female (false)
 */
module dovetail(width, teeth_count, teeth_height, teeth_thickness, clear = 0.1, male = true) {

    /**
     * 4 sections :
     *
     * |1/2         1/2|
     * |--+ <- 3 -> +--|--+         +--
     * |   \1  1  1/   |   \       /
     * |    \_____/    |    \_____/
     */

    y = ((width - teeth_count * 2 * clear) / teeth_count) / 4;

    compensation = - 0.1;
    teeth_width = y * 3;

    // Always width / 3 (ref. dovetail_teeth())
    offset = teeth_width / 3;
    start_at = clear * 2 + teeth_width / 2 - width / 2 - clear;

    translate([0, 0, - teeth_thickness / 2]) {

        // Debug purpose only
        % union() {
            translate([- width / 2, 0, - width / 2]) cube(size = [width, 0.01, width]);
        }

        for (i = [-1 : teeth_count * 2 - 1] ) {
            if (i % 2) {
                assign(x = start_at + y / 2 + (teeth_width - offset + clear) * i + 0.1) {
                    translate([x + compensation, - clear, 0]) {
                        rotate([0, 0, 180]) {
                            if (male == true) {
                                dovetail_teeth(teeth_width - clear, teeth_height - clear, teeth_thickness);
                            }
                        }
                    }
                }
            } else {
                assign(x = start_at + y / 2 + (teeth_width - offset + clear) * i) {
                    translate([x, clear, 0]) {
                        if (male == false) {
                            dovetail_teeth(teeth_width - clear, teeth_height - clear, teeth_thickness);
                        }
                    }
                }
            }
        }
    }
}

/**
 *  Cut piece
 *  @param vector position  Cut position ([x, y, z])
 *  @param vector dimension Dimension of bounding box ([w, l, h])
 *  @param vector teeths    Teeths parameters ([count, height, clearance])
 *  @param bool   male      Get male (true) or female (false)
 */
module cutter(position, dimension, teeths, male = true) {
    translate(position) {
        dovetail(dimension[0], teeths[0], teeths[1], dimension[2], teeths[2], male);

        if (male) {
            translate([- dimension[0] / 2, - (teeths[1] / 2 - 0.1) - dimension[1], - dimension[2] / 2]) {
                cube(size = dimension);
            }
        } else {
            translate([- dimension[0] / 2, teeths[1] / 2 - 0.1, , - dimension[2] / 2]) {
                cube(size = dimension);
            }
        }
    }
}


module demo() {
    dim = [20, 60, 5];
    clear = 0.3;

    /**
     * [x, y, z]
     * - x : Teeth count
     * - y : Teeth height
     * - z : Teeth Clearance
     */
    teeth = [3, 4, clear];

    % cube(size = dim, center = true);

    color("GREEN") intersection() {
        cube(size = dim, center = true);
        cutter([0, -10, 0], dim, teeth, true);
    }

    //translate([22, 0, 0])
    color("RED") intersection() {
        cube(size = dim, center = true);
        cutter([0, -10, 0], dim, teeth, false);
        cutter([0, 10, 0], dim, teeth, true);
    }

    //translate([44, 0, 0])
    color("BLUE") intersection() {
        cube(size = dim, center = true);
        cutter([0, 10, 0], dim, teeth, false);
    }
}


//demo();
// main file
include <libs/hugo_dovetail.scad>
include <sodastream_tube_holder.scad>

//CUTS = [[0, 150, 0], [0, 260, 0], [0, 290, 0]];
CUTS = [[0, 150, 0], [0, 290, 0]];
DOVETAIL_CLEAR = 0.3;
DOVETAIL_TEETH = [3, 4, DOVETAIL_CLEAR];

//CUT_CUBE_DIM = [OUTER_DIAMETER + 10, 250, OUTER_DIAMETER + 10];
CUT_CUBE_DIM = [89, 150, 160];

module cutHolder() {
    // Base
    intersection() {
        rotatedHolder();
        cutter(CUTS[0], CUT_CUBE_DIM, DOVETAIL_TEETH, true);
    }
    
    // Collar
    intersection() {
        rotatedHolder();
        cutter(CUTS[0], CUT_CUBE_DIM, DOVETAIL_TEETH, false);
        cutter(CUTS[1], CUT_CUBE_DIM, DOVETAIL_TEETH, true);
    }
    
    // Hook
    intersection() {
        rotatedHolder();
        cutter(CUTS[1], CUT_CUBE_DIM, DOVETAIL_TEETH, false);
    }
    
}

cutHolder();
